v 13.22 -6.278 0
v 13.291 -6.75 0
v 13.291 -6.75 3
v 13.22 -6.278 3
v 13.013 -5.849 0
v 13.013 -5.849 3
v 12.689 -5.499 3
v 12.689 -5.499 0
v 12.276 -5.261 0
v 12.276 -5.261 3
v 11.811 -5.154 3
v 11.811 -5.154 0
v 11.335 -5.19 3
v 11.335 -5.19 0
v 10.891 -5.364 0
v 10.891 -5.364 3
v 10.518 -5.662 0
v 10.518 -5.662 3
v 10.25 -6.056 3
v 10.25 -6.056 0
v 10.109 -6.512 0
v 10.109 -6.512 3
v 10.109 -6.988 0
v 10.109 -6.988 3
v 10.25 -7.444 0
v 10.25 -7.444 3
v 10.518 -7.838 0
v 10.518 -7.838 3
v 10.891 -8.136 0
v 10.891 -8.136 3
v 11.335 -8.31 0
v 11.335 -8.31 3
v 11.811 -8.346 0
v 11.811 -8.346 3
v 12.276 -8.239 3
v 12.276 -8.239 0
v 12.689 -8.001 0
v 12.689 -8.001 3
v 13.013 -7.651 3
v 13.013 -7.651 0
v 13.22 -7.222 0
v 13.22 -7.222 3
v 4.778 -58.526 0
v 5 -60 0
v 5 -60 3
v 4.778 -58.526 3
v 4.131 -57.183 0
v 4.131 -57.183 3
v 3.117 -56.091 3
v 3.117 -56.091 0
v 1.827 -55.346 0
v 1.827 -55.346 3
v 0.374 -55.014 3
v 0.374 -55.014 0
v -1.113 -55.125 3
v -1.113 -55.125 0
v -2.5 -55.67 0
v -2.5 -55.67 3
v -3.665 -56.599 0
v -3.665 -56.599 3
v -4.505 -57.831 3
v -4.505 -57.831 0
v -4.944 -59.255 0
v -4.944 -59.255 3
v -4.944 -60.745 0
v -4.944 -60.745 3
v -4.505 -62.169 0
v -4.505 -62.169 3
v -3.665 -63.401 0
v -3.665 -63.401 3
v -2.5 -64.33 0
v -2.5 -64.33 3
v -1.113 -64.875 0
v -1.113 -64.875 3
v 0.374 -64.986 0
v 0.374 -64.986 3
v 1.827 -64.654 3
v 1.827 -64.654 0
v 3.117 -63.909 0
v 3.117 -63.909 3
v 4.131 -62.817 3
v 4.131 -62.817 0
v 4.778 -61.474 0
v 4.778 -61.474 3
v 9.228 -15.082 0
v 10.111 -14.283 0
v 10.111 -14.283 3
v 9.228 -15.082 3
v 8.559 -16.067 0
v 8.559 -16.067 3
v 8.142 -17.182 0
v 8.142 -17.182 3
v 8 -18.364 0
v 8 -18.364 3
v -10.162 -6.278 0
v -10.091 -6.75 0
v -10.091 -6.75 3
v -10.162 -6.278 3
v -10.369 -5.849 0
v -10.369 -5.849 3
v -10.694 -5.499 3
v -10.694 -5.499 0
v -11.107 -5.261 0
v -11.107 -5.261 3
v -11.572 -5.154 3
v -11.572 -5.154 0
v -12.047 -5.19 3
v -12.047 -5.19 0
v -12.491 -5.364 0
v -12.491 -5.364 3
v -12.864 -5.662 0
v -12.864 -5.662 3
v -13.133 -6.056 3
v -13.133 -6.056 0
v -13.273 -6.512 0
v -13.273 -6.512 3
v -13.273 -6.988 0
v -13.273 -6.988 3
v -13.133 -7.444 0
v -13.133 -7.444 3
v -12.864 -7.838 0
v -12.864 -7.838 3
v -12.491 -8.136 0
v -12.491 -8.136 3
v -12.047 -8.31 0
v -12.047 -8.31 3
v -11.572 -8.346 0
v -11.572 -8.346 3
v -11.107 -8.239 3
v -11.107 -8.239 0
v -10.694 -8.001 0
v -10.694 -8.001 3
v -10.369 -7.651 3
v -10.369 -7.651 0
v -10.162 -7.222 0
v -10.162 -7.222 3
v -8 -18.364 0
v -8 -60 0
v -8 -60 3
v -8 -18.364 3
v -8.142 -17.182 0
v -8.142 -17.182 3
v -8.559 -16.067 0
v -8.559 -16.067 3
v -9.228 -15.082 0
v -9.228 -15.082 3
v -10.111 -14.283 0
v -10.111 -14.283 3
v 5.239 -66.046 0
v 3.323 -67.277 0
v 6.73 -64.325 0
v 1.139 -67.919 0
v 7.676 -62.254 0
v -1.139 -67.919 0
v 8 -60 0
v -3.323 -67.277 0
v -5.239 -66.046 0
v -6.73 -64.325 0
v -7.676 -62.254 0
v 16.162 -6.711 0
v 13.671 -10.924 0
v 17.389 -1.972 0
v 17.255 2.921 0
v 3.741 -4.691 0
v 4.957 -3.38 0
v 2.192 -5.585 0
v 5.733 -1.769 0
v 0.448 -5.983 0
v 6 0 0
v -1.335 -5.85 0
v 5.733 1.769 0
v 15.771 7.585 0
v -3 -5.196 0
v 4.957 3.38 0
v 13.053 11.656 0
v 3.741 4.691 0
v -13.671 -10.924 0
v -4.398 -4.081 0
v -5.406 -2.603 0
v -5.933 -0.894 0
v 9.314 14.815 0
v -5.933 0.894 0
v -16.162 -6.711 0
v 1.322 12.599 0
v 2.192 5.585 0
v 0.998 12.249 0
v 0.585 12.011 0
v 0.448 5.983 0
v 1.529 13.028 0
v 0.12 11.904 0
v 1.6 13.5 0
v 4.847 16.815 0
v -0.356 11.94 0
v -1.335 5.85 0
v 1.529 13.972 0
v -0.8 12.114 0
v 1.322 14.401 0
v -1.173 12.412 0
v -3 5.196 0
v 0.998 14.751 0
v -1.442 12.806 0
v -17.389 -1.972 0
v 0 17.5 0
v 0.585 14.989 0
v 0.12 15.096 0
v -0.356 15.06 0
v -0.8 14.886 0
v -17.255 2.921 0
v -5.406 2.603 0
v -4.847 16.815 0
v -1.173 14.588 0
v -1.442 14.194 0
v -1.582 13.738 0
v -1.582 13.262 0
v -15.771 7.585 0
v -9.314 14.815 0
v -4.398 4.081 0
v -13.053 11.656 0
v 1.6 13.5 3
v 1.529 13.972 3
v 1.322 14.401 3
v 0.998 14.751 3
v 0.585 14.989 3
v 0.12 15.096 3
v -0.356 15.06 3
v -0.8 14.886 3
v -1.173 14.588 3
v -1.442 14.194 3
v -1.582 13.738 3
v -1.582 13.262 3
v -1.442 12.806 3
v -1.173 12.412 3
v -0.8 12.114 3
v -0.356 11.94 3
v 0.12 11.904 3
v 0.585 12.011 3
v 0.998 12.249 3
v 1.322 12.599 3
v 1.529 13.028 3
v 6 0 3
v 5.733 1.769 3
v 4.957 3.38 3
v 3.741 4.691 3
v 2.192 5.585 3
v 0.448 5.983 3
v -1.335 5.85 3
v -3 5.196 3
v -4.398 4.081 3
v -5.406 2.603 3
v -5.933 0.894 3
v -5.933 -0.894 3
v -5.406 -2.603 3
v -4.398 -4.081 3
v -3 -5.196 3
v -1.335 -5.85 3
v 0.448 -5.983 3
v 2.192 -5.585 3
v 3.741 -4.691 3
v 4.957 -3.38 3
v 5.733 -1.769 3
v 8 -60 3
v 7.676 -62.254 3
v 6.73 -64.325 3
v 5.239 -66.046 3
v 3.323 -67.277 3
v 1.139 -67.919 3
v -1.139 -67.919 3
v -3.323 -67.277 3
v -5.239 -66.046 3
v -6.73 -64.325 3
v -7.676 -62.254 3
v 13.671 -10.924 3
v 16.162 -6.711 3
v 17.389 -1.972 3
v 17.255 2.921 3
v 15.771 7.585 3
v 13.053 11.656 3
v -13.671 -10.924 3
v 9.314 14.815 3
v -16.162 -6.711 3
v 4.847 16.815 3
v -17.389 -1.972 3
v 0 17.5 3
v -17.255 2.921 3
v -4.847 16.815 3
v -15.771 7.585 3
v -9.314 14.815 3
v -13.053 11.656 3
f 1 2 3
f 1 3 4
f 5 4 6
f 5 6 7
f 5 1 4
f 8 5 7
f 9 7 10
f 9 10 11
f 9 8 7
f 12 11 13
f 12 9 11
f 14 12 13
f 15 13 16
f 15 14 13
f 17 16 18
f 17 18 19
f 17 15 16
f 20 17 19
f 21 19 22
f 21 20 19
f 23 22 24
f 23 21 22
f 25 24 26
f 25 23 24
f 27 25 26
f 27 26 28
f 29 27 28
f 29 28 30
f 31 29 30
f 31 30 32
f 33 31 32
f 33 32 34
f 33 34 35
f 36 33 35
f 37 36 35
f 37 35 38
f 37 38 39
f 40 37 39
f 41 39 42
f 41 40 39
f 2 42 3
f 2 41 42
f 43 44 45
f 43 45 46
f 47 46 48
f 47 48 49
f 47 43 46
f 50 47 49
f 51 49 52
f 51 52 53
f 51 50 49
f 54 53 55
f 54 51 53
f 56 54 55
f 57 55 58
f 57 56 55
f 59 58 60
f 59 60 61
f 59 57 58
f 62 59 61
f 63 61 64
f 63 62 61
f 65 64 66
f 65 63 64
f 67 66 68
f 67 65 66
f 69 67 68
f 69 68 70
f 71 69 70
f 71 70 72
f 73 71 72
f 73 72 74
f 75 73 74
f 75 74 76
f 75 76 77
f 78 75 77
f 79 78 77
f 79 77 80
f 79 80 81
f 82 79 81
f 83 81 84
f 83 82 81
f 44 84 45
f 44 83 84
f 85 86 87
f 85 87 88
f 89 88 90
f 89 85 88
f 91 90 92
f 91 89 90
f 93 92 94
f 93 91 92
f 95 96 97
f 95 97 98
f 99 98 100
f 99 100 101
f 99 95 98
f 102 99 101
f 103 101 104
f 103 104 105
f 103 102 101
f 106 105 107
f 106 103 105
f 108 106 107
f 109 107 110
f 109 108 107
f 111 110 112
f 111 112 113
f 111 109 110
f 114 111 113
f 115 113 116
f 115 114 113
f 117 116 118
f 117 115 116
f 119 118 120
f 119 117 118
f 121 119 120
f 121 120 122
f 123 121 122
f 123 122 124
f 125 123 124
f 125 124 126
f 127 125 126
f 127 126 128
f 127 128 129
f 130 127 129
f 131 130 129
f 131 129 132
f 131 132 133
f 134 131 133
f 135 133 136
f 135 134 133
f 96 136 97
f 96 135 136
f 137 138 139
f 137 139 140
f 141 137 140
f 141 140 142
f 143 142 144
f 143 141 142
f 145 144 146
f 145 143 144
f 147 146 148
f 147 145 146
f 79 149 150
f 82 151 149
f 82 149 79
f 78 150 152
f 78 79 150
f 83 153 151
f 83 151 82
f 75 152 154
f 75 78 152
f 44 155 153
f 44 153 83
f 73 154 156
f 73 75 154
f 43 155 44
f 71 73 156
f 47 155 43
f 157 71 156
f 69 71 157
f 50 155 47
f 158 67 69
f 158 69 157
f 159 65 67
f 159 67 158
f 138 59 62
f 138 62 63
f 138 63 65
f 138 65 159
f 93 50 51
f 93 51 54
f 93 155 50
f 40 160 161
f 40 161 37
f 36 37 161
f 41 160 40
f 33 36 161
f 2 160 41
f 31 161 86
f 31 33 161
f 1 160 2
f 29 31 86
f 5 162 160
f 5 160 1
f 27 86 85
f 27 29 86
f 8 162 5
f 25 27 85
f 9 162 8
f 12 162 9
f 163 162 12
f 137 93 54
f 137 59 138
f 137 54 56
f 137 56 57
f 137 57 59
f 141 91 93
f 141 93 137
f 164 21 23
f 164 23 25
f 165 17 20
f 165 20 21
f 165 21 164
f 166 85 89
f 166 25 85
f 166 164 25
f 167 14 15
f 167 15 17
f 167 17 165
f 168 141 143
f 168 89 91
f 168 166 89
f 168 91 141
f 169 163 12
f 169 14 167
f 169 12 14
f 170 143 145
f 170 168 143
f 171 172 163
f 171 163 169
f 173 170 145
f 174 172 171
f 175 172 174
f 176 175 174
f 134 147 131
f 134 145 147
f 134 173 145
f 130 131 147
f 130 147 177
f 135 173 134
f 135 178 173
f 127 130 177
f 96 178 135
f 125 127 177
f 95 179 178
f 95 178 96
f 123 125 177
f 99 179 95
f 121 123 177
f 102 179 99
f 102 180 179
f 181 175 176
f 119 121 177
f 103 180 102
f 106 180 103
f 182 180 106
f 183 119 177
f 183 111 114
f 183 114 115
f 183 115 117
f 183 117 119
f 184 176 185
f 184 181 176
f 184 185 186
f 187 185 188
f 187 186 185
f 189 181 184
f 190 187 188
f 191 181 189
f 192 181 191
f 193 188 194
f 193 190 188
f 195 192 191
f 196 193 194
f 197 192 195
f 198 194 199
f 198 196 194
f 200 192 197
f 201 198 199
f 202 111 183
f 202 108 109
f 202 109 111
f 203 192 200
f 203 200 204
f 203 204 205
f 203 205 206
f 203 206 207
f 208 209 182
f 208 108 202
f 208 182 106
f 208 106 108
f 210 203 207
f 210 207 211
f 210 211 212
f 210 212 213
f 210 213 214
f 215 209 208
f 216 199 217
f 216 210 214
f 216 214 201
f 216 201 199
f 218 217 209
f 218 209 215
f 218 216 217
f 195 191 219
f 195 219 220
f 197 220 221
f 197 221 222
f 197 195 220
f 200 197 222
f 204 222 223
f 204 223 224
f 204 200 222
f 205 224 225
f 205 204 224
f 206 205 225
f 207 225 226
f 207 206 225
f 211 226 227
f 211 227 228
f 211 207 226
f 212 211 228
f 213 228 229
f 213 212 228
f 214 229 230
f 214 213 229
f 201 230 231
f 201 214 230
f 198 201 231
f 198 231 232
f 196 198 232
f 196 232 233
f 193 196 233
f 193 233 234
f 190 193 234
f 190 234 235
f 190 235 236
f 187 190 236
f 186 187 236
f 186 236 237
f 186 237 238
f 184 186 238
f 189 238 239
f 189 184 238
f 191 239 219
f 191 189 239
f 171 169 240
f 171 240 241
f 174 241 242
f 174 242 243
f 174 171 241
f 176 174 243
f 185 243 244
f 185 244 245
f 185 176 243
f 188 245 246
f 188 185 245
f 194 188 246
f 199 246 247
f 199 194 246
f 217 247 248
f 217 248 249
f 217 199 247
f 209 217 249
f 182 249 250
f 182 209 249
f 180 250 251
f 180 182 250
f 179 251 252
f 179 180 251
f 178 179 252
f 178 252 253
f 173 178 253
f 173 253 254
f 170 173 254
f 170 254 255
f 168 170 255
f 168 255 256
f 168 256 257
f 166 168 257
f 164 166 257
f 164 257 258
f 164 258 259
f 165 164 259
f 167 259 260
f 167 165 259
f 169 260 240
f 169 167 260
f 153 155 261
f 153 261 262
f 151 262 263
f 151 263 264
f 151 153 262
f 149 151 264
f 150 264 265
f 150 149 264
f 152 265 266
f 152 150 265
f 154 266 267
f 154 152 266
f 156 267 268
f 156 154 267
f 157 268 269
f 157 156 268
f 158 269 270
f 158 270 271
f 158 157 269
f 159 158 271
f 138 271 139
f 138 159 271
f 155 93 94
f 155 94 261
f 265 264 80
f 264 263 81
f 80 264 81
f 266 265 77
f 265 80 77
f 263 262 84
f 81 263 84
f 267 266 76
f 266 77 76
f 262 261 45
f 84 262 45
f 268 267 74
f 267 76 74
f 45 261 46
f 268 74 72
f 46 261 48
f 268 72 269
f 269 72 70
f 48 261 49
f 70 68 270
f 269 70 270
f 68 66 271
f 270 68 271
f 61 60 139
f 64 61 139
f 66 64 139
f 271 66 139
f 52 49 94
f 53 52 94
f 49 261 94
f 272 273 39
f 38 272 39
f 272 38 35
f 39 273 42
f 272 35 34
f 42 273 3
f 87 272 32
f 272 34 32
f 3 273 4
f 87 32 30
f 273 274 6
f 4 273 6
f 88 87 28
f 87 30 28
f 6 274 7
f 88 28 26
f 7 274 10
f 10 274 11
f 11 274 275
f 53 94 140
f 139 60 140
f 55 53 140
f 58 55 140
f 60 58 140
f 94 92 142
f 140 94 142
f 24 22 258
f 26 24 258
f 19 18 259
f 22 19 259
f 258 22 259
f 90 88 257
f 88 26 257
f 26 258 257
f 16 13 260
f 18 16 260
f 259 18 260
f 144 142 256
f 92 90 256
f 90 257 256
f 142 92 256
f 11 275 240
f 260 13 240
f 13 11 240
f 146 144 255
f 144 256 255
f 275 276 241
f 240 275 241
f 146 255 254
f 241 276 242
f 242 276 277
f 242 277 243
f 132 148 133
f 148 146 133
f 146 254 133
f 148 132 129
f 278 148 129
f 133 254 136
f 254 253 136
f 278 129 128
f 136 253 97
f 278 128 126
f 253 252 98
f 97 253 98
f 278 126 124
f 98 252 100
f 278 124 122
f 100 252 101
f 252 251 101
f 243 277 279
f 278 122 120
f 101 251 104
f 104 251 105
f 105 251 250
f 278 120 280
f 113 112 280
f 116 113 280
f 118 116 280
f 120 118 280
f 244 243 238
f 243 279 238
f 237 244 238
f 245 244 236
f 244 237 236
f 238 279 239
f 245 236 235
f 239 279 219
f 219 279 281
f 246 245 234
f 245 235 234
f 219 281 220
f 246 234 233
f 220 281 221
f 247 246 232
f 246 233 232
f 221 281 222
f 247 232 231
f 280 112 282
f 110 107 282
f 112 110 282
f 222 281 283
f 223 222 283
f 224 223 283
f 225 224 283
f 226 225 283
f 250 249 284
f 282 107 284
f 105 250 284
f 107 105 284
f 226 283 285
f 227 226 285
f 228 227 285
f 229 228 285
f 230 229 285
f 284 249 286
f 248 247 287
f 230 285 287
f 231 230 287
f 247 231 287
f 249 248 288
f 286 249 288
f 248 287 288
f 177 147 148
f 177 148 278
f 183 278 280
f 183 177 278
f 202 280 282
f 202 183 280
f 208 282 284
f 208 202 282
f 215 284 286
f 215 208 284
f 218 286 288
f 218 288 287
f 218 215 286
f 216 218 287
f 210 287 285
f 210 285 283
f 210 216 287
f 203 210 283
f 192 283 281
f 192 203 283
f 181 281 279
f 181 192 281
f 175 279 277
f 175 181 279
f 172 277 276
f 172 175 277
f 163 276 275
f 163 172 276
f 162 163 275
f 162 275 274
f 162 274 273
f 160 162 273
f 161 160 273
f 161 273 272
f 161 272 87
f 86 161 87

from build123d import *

# Parameters (mm, degrees)
SKETCH_1_R      = 1.6
SKETCH_1_R_2    = 6
SKETCH_1_R_3    = 5
EXTRUDE_1_DEPTH = 3


with BuildPart() as part:
    # 草图1 → 凸台-拉伸1 (new body)
    with BuildSketch(Plane.XY):
        with BuildLine():
            Line((-8, -60), (-8, -18.364367672))
            ThreePointArc((-8, -18.364367672), (-8.559029135, -16.067026214), (-10.111111111, -14.283397078))
            ThreePointArc((-10.111111111, -14.283397078), (0, 17.5), (10.111111111, -14.283397078))
            ThreePointArc((10.111111111, -14.283397078), (8.559029135, -16.067026214), (8, -18.364367672))
            Line((8, -18.364367672), (8, -60))
            ThreePointArc((8, -60), (0, -68), (-8, -60))
        make_face()
        with Locations((0, 13.5)):
            Circle(SKETCH_1_R, mode=Mode.SUBTRACT)
        with Locations((11.691342951, -6.75)):
            Circle(SKETCH_1_R, mode=Mode.SUBTRACT)
        with Locations((-11.691342951, -6.75)):
            Circle(SKETCH_1_R, mode=Mode.SUBTRACT)
        Circle(SKETCH_1_R_2, mode=Mode.SUBTRACT)
        with Locations((0, -60)):
            Circle(SKETCH_1_R_3, mode=Mode.SUBTRACT)
    extrude(amount=EXTRUDE_1_DEPTH)


solid = part.part
